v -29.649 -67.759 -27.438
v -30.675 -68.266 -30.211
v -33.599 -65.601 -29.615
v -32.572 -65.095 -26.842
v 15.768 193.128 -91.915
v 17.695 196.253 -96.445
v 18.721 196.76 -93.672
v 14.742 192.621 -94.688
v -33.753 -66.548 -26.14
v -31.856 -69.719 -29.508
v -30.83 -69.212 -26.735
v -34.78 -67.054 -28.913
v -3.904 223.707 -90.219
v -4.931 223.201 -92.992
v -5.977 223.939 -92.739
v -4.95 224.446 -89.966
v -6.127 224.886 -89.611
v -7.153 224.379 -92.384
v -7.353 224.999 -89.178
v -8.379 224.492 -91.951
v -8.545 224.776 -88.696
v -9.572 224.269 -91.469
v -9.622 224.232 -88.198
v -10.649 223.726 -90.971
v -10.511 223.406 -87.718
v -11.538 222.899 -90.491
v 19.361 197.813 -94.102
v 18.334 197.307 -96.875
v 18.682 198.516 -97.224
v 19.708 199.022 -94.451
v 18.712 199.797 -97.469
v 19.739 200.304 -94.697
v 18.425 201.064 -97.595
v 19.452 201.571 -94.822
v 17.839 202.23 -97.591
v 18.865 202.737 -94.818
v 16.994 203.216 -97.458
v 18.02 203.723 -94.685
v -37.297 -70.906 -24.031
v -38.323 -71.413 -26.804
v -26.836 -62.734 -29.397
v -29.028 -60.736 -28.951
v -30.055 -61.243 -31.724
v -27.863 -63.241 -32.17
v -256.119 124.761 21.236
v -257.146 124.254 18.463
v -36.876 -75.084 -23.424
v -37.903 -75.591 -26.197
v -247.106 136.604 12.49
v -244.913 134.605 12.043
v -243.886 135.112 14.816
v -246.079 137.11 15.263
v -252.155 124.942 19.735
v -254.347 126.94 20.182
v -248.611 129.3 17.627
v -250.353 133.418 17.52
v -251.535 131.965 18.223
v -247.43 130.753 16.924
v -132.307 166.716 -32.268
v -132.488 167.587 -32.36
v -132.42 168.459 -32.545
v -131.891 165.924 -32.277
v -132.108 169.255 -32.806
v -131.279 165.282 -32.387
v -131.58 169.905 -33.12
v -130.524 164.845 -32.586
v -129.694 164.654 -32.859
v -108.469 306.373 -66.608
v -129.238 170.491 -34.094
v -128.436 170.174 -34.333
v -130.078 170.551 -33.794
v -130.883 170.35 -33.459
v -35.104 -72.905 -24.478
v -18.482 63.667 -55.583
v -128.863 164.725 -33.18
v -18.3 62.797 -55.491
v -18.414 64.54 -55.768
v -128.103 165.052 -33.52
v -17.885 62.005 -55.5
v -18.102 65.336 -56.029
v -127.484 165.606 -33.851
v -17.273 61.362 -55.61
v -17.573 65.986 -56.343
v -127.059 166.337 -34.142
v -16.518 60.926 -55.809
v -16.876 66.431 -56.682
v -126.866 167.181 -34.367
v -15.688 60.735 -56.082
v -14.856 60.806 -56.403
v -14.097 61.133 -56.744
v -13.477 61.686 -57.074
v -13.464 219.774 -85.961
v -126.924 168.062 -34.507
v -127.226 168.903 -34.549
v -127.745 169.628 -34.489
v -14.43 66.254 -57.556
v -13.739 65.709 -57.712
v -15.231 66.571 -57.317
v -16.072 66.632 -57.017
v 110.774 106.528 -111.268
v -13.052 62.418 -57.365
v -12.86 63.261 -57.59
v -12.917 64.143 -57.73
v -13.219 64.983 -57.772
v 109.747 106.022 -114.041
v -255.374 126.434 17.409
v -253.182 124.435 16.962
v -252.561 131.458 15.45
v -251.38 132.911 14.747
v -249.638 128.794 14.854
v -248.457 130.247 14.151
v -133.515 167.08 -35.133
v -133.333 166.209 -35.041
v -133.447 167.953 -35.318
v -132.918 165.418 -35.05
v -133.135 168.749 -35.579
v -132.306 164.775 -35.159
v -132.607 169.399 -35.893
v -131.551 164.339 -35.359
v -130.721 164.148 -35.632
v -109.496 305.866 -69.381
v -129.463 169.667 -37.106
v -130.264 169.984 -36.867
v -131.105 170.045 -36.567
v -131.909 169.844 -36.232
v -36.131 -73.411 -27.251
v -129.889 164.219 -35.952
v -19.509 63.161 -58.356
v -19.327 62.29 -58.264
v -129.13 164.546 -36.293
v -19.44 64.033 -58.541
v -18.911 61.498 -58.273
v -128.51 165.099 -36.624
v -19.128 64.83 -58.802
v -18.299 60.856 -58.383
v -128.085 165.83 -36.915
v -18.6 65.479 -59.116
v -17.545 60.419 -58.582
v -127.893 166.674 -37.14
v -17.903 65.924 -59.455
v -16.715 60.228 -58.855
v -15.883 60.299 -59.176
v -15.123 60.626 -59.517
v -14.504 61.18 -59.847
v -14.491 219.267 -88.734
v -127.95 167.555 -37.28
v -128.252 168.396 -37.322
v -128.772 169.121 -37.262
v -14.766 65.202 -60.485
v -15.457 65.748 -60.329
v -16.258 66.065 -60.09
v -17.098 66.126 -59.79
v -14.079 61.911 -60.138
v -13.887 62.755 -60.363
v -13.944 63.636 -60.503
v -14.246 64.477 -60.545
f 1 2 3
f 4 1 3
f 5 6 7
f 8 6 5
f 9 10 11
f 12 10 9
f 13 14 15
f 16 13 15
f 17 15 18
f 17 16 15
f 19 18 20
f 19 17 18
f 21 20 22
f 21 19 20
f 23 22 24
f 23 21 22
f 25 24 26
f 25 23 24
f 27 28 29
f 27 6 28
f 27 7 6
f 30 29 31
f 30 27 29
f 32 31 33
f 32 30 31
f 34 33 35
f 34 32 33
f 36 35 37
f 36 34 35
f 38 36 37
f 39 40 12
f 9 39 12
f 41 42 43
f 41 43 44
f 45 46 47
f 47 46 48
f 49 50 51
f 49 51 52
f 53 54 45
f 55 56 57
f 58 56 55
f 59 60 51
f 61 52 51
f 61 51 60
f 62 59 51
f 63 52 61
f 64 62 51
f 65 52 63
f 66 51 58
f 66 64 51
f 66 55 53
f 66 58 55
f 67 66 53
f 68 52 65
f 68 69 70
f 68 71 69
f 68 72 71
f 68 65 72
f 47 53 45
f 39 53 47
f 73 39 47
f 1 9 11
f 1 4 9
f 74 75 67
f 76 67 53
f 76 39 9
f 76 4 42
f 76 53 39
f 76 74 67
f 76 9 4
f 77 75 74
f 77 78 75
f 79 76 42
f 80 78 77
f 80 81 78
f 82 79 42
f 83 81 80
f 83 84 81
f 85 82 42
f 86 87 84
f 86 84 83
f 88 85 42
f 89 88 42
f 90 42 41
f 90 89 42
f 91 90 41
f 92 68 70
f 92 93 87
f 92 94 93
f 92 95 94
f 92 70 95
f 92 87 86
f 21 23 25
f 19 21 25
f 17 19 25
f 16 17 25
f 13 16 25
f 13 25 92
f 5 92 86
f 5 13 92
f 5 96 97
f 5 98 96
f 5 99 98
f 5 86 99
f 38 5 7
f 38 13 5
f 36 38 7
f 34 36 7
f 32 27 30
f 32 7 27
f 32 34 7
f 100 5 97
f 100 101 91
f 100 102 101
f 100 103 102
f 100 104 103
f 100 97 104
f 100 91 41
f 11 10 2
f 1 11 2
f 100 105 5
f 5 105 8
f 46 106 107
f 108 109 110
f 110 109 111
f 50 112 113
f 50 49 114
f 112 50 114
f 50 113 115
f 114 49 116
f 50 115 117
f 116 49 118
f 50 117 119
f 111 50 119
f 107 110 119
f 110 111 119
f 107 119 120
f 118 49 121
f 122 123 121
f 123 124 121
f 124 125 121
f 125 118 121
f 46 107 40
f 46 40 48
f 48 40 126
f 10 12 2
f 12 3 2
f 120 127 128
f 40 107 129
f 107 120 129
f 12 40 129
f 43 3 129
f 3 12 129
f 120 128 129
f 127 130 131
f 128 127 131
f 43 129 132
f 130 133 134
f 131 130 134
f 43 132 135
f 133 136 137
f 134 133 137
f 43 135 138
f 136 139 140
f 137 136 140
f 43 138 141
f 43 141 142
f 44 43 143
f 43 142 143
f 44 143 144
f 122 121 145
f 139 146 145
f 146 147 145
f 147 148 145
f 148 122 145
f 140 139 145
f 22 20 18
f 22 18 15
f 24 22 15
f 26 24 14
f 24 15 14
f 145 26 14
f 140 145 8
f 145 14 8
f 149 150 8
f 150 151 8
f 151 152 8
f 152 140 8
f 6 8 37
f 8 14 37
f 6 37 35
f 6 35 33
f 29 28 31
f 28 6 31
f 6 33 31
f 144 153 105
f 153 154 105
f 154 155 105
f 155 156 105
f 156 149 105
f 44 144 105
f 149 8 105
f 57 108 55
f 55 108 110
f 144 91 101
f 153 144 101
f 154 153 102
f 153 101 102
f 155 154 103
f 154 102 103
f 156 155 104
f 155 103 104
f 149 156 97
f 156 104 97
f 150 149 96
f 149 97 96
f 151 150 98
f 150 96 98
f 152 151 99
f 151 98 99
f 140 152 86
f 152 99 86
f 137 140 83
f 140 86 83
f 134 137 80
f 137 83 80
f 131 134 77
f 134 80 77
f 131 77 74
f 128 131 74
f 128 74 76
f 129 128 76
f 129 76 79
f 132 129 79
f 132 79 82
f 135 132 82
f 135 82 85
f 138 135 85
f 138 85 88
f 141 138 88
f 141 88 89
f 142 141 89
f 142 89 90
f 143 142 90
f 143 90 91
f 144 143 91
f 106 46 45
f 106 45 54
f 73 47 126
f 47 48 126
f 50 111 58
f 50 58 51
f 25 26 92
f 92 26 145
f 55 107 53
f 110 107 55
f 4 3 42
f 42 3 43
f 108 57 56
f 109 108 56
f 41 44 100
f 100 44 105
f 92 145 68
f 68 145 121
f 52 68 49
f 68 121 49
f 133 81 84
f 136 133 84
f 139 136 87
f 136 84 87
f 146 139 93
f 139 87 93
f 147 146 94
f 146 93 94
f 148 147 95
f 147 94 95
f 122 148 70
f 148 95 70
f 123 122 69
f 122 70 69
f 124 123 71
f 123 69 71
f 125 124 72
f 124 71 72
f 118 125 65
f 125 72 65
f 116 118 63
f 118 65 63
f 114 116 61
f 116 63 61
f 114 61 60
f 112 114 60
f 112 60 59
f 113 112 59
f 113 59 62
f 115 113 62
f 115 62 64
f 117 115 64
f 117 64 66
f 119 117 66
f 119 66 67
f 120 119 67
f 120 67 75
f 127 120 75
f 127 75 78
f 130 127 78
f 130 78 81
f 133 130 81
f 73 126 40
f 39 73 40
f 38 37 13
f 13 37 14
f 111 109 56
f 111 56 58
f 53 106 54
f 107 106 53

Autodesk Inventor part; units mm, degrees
ref_plane "YZ Plane" through (0, 0, 0) normal (1, 0, 0) x (0, 1, 0)
ref_plane "XZ Plane" through (0, 0, 0) normal (0, 1, 0) x (-1, 0, 0)
ref_plane "XY Plane" through (0, 0, 0) normal (0, 0, 1) x (1, 0, 0)
ref_plane "Plano de trabalho1" through (-73.6994, 115.1379, -47.7889) normal (0.3422133, 0.1688693, 0.9243231) x (0.7308101, -0.6661496, -0.1488665)
sketch "Esboço3" plane through (-73.6994, 115.1379, -47.7889) normal (0.3422133, 0.1688693, 0.9243231) x (0.7308101, -0.6661496, -0.1488665)
  line L0 (0, 0) -> (150, 0)
  line L1 (150, 0) -> (150, 125)
  line L2 (-150, -125) -> (150, -125)
  line L3 (150, -125) -> (147, -125)
  line L4 (150, -125) -> (150, -122)
  line L5 (150, -122) -> (147, -122)
  line L6 (147, -108) -> (150, -108)
  line L7 (150, -125) -> (150, -122)
  line L8 (150, -108) -> (150, 125)
  line L9 (-150, -125) -> (-150, -122)
  line L10 (-150, -122) -> (-147, -122)
  line L11 (-147, -108) -> (-150, -108)
  line L12 (-150, 125) -> (-150, -108)
  line L13 (-150, -122) -> (-150, -125)
  line L14 (0, 135) -> (20, 135)
  line L15 (0, 135) -> (-20, 135)
  line L16 (-20, 135) -> (-20, 125)
  line L17 (20, 135) -> (20, 125)
  line L18 (150, 125) -> (20, 125)
  line L19 (-20, 125) -> (-150, 125)
  line L20 (-151, -115) -> (-151, -114)
  line L21 (-151, -114) -> (-147, -114)
  line L22 (-151, -115) -> (-151, -116)
  line L23 (-151, -116) -> (-147, -116)
  line L24 (-147, -122) -> (-147, -116)
  line L25 (-147, -114) -> (-147, -108)
  line L26 (151, -115) -> (151, -114)
  line L27 (151, -114) -> (147, -114)
  line L28 (151, -115) -> (151, -116)
  line L29 (151, -116) -> (147, -116)
  line L30 (147, -122) -> (147, -116)
  line L31 (147, -114) -> (147, -108)
  point P0 (123.4452, -56.9069)
  dimension "d24" = 150
  dimension "d25" = 125
  dimension "d26" = 300
  dimension "d27" = 250
  dimension "d33" = 3
  dimension "d34" = 3
  dimension "d37" = 20
  dimension "d43" = 1
  dimension "d44" = 1
extrude "Extrusão3" add sketch "Esboço3" along normal blind 3
fillet "Arredondamento1" radius 5 2 edges at (21.1609, 200.1388, -96.8156) (-8.0715, 226.7848, -90.8609)
sketch "Esboço4" plane through (-72.6728, 115.6445, -45.0159) normal (0.3422133, 0.1688693, 0.9243231) x (0.7308101, -0.6661496, -0.1488665)
  line L0 (150, 125) -> (20, 125) projected
  line L1 (-20, 125) -> (-150, 125) projected
  line L2 (20, 125) -> (-20, 125)
  line L3 (0, 125) -> (0, -125)
  line L4 (-150, -125) -> (150, -125) projected
  line L5 (0, 0) -> (75, 0)
  line L6 (0, 0) -> (-75, 0)
  line L7 (-75, 0) -> (-78, 0)
  line L8 (75, 0) -> (78, 0)
  circle A0 centre (78, 0) radius 3
  circle A1 centre (-78, 0) radius 3
  dimension "d48" = 75
  dimension "d49" = 75
  dimension "d50" = 3
  dimension "d51" = 3
extrude "Extrusão4" cut sketch "Esboço4" against normal blind 3
properties part number "tampa"
